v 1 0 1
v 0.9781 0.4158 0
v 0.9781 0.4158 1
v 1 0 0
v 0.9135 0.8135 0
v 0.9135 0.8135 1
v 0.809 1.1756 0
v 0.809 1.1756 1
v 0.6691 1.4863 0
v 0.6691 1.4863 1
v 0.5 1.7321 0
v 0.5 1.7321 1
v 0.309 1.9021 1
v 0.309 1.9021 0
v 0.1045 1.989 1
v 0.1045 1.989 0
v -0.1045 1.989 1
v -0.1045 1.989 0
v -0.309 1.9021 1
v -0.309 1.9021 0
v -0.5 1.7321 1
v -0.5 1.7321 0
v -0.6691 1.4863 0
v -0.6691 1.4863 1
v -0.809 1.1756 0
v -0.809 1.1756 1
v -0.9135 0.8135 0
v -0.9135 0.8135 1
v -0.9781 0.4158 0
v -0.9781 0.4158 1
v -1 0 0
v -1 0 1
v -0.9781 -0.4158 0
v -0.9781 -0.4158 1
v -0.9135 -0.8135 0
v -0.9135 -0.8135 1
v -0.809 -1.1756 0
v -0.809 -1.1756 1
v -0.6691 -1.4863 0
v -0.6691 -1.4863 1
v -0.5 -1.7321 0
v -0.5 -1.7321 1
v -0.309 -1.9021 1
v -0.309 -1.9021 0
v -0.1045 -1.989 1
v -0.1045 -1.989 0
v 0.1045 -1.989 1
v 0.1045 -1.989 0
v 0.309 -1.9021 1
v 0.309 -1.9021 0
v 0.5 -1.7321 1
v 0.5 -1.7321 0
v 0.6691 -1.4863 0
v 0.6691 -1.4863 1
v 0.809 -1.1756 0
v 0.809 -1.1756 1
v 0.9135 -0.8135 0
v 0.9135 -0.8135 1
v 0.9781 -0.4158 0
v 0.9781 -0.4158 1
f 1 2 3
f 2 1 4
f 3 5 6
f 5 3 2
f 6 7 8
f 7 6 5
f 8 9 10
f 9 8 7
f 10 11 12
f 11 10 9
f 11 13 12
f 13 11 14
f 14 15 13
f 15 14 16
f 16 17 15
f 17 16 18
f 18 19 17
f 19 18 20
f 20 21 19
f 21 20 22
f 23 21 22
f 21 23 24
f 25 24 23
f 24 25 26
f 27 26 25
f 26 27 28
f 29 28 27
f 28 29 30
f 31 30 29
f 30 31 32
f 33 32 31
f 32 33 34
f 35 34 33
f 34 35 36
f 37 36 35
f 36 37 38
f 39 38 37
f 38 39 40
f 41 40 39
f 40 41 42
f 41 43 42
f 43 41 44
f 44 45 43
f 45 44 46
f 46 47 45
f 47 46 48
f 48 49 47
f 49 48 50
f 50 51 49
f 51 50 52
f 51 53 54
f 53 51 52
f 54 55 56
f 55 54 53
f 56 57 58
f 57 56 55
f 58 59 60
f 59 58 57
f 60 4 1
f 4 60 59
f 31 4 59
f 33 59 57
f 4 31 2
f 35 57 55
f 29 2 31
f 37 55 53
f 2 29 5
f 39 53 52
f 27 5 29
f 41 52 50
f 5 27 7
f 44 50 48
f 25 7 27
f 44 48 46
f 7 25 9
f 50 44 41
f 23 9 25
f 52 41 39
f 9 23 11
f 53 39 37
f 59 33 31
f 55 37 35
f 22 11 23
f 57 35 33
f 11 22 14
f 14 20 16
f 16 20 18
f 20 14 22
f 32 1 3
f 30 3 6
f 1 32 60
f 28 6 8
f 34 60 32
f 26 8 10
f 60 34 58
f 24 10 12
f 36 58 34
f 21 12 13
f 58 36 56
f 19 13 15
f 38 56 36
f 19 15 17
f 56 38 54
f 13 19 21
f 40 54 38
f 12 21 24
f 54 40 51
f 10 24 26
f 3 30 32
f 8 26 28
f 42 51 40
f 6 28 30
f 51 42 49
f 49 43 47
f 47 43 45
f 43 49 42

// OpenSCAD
/// Oval
$fn=30;
/// Example
translate()oval(1,2,1);

module oval(w,l, height, center = false) {
 scale([1, l/w, 1]) cylinder(h=height, r=w, center=center);
}
